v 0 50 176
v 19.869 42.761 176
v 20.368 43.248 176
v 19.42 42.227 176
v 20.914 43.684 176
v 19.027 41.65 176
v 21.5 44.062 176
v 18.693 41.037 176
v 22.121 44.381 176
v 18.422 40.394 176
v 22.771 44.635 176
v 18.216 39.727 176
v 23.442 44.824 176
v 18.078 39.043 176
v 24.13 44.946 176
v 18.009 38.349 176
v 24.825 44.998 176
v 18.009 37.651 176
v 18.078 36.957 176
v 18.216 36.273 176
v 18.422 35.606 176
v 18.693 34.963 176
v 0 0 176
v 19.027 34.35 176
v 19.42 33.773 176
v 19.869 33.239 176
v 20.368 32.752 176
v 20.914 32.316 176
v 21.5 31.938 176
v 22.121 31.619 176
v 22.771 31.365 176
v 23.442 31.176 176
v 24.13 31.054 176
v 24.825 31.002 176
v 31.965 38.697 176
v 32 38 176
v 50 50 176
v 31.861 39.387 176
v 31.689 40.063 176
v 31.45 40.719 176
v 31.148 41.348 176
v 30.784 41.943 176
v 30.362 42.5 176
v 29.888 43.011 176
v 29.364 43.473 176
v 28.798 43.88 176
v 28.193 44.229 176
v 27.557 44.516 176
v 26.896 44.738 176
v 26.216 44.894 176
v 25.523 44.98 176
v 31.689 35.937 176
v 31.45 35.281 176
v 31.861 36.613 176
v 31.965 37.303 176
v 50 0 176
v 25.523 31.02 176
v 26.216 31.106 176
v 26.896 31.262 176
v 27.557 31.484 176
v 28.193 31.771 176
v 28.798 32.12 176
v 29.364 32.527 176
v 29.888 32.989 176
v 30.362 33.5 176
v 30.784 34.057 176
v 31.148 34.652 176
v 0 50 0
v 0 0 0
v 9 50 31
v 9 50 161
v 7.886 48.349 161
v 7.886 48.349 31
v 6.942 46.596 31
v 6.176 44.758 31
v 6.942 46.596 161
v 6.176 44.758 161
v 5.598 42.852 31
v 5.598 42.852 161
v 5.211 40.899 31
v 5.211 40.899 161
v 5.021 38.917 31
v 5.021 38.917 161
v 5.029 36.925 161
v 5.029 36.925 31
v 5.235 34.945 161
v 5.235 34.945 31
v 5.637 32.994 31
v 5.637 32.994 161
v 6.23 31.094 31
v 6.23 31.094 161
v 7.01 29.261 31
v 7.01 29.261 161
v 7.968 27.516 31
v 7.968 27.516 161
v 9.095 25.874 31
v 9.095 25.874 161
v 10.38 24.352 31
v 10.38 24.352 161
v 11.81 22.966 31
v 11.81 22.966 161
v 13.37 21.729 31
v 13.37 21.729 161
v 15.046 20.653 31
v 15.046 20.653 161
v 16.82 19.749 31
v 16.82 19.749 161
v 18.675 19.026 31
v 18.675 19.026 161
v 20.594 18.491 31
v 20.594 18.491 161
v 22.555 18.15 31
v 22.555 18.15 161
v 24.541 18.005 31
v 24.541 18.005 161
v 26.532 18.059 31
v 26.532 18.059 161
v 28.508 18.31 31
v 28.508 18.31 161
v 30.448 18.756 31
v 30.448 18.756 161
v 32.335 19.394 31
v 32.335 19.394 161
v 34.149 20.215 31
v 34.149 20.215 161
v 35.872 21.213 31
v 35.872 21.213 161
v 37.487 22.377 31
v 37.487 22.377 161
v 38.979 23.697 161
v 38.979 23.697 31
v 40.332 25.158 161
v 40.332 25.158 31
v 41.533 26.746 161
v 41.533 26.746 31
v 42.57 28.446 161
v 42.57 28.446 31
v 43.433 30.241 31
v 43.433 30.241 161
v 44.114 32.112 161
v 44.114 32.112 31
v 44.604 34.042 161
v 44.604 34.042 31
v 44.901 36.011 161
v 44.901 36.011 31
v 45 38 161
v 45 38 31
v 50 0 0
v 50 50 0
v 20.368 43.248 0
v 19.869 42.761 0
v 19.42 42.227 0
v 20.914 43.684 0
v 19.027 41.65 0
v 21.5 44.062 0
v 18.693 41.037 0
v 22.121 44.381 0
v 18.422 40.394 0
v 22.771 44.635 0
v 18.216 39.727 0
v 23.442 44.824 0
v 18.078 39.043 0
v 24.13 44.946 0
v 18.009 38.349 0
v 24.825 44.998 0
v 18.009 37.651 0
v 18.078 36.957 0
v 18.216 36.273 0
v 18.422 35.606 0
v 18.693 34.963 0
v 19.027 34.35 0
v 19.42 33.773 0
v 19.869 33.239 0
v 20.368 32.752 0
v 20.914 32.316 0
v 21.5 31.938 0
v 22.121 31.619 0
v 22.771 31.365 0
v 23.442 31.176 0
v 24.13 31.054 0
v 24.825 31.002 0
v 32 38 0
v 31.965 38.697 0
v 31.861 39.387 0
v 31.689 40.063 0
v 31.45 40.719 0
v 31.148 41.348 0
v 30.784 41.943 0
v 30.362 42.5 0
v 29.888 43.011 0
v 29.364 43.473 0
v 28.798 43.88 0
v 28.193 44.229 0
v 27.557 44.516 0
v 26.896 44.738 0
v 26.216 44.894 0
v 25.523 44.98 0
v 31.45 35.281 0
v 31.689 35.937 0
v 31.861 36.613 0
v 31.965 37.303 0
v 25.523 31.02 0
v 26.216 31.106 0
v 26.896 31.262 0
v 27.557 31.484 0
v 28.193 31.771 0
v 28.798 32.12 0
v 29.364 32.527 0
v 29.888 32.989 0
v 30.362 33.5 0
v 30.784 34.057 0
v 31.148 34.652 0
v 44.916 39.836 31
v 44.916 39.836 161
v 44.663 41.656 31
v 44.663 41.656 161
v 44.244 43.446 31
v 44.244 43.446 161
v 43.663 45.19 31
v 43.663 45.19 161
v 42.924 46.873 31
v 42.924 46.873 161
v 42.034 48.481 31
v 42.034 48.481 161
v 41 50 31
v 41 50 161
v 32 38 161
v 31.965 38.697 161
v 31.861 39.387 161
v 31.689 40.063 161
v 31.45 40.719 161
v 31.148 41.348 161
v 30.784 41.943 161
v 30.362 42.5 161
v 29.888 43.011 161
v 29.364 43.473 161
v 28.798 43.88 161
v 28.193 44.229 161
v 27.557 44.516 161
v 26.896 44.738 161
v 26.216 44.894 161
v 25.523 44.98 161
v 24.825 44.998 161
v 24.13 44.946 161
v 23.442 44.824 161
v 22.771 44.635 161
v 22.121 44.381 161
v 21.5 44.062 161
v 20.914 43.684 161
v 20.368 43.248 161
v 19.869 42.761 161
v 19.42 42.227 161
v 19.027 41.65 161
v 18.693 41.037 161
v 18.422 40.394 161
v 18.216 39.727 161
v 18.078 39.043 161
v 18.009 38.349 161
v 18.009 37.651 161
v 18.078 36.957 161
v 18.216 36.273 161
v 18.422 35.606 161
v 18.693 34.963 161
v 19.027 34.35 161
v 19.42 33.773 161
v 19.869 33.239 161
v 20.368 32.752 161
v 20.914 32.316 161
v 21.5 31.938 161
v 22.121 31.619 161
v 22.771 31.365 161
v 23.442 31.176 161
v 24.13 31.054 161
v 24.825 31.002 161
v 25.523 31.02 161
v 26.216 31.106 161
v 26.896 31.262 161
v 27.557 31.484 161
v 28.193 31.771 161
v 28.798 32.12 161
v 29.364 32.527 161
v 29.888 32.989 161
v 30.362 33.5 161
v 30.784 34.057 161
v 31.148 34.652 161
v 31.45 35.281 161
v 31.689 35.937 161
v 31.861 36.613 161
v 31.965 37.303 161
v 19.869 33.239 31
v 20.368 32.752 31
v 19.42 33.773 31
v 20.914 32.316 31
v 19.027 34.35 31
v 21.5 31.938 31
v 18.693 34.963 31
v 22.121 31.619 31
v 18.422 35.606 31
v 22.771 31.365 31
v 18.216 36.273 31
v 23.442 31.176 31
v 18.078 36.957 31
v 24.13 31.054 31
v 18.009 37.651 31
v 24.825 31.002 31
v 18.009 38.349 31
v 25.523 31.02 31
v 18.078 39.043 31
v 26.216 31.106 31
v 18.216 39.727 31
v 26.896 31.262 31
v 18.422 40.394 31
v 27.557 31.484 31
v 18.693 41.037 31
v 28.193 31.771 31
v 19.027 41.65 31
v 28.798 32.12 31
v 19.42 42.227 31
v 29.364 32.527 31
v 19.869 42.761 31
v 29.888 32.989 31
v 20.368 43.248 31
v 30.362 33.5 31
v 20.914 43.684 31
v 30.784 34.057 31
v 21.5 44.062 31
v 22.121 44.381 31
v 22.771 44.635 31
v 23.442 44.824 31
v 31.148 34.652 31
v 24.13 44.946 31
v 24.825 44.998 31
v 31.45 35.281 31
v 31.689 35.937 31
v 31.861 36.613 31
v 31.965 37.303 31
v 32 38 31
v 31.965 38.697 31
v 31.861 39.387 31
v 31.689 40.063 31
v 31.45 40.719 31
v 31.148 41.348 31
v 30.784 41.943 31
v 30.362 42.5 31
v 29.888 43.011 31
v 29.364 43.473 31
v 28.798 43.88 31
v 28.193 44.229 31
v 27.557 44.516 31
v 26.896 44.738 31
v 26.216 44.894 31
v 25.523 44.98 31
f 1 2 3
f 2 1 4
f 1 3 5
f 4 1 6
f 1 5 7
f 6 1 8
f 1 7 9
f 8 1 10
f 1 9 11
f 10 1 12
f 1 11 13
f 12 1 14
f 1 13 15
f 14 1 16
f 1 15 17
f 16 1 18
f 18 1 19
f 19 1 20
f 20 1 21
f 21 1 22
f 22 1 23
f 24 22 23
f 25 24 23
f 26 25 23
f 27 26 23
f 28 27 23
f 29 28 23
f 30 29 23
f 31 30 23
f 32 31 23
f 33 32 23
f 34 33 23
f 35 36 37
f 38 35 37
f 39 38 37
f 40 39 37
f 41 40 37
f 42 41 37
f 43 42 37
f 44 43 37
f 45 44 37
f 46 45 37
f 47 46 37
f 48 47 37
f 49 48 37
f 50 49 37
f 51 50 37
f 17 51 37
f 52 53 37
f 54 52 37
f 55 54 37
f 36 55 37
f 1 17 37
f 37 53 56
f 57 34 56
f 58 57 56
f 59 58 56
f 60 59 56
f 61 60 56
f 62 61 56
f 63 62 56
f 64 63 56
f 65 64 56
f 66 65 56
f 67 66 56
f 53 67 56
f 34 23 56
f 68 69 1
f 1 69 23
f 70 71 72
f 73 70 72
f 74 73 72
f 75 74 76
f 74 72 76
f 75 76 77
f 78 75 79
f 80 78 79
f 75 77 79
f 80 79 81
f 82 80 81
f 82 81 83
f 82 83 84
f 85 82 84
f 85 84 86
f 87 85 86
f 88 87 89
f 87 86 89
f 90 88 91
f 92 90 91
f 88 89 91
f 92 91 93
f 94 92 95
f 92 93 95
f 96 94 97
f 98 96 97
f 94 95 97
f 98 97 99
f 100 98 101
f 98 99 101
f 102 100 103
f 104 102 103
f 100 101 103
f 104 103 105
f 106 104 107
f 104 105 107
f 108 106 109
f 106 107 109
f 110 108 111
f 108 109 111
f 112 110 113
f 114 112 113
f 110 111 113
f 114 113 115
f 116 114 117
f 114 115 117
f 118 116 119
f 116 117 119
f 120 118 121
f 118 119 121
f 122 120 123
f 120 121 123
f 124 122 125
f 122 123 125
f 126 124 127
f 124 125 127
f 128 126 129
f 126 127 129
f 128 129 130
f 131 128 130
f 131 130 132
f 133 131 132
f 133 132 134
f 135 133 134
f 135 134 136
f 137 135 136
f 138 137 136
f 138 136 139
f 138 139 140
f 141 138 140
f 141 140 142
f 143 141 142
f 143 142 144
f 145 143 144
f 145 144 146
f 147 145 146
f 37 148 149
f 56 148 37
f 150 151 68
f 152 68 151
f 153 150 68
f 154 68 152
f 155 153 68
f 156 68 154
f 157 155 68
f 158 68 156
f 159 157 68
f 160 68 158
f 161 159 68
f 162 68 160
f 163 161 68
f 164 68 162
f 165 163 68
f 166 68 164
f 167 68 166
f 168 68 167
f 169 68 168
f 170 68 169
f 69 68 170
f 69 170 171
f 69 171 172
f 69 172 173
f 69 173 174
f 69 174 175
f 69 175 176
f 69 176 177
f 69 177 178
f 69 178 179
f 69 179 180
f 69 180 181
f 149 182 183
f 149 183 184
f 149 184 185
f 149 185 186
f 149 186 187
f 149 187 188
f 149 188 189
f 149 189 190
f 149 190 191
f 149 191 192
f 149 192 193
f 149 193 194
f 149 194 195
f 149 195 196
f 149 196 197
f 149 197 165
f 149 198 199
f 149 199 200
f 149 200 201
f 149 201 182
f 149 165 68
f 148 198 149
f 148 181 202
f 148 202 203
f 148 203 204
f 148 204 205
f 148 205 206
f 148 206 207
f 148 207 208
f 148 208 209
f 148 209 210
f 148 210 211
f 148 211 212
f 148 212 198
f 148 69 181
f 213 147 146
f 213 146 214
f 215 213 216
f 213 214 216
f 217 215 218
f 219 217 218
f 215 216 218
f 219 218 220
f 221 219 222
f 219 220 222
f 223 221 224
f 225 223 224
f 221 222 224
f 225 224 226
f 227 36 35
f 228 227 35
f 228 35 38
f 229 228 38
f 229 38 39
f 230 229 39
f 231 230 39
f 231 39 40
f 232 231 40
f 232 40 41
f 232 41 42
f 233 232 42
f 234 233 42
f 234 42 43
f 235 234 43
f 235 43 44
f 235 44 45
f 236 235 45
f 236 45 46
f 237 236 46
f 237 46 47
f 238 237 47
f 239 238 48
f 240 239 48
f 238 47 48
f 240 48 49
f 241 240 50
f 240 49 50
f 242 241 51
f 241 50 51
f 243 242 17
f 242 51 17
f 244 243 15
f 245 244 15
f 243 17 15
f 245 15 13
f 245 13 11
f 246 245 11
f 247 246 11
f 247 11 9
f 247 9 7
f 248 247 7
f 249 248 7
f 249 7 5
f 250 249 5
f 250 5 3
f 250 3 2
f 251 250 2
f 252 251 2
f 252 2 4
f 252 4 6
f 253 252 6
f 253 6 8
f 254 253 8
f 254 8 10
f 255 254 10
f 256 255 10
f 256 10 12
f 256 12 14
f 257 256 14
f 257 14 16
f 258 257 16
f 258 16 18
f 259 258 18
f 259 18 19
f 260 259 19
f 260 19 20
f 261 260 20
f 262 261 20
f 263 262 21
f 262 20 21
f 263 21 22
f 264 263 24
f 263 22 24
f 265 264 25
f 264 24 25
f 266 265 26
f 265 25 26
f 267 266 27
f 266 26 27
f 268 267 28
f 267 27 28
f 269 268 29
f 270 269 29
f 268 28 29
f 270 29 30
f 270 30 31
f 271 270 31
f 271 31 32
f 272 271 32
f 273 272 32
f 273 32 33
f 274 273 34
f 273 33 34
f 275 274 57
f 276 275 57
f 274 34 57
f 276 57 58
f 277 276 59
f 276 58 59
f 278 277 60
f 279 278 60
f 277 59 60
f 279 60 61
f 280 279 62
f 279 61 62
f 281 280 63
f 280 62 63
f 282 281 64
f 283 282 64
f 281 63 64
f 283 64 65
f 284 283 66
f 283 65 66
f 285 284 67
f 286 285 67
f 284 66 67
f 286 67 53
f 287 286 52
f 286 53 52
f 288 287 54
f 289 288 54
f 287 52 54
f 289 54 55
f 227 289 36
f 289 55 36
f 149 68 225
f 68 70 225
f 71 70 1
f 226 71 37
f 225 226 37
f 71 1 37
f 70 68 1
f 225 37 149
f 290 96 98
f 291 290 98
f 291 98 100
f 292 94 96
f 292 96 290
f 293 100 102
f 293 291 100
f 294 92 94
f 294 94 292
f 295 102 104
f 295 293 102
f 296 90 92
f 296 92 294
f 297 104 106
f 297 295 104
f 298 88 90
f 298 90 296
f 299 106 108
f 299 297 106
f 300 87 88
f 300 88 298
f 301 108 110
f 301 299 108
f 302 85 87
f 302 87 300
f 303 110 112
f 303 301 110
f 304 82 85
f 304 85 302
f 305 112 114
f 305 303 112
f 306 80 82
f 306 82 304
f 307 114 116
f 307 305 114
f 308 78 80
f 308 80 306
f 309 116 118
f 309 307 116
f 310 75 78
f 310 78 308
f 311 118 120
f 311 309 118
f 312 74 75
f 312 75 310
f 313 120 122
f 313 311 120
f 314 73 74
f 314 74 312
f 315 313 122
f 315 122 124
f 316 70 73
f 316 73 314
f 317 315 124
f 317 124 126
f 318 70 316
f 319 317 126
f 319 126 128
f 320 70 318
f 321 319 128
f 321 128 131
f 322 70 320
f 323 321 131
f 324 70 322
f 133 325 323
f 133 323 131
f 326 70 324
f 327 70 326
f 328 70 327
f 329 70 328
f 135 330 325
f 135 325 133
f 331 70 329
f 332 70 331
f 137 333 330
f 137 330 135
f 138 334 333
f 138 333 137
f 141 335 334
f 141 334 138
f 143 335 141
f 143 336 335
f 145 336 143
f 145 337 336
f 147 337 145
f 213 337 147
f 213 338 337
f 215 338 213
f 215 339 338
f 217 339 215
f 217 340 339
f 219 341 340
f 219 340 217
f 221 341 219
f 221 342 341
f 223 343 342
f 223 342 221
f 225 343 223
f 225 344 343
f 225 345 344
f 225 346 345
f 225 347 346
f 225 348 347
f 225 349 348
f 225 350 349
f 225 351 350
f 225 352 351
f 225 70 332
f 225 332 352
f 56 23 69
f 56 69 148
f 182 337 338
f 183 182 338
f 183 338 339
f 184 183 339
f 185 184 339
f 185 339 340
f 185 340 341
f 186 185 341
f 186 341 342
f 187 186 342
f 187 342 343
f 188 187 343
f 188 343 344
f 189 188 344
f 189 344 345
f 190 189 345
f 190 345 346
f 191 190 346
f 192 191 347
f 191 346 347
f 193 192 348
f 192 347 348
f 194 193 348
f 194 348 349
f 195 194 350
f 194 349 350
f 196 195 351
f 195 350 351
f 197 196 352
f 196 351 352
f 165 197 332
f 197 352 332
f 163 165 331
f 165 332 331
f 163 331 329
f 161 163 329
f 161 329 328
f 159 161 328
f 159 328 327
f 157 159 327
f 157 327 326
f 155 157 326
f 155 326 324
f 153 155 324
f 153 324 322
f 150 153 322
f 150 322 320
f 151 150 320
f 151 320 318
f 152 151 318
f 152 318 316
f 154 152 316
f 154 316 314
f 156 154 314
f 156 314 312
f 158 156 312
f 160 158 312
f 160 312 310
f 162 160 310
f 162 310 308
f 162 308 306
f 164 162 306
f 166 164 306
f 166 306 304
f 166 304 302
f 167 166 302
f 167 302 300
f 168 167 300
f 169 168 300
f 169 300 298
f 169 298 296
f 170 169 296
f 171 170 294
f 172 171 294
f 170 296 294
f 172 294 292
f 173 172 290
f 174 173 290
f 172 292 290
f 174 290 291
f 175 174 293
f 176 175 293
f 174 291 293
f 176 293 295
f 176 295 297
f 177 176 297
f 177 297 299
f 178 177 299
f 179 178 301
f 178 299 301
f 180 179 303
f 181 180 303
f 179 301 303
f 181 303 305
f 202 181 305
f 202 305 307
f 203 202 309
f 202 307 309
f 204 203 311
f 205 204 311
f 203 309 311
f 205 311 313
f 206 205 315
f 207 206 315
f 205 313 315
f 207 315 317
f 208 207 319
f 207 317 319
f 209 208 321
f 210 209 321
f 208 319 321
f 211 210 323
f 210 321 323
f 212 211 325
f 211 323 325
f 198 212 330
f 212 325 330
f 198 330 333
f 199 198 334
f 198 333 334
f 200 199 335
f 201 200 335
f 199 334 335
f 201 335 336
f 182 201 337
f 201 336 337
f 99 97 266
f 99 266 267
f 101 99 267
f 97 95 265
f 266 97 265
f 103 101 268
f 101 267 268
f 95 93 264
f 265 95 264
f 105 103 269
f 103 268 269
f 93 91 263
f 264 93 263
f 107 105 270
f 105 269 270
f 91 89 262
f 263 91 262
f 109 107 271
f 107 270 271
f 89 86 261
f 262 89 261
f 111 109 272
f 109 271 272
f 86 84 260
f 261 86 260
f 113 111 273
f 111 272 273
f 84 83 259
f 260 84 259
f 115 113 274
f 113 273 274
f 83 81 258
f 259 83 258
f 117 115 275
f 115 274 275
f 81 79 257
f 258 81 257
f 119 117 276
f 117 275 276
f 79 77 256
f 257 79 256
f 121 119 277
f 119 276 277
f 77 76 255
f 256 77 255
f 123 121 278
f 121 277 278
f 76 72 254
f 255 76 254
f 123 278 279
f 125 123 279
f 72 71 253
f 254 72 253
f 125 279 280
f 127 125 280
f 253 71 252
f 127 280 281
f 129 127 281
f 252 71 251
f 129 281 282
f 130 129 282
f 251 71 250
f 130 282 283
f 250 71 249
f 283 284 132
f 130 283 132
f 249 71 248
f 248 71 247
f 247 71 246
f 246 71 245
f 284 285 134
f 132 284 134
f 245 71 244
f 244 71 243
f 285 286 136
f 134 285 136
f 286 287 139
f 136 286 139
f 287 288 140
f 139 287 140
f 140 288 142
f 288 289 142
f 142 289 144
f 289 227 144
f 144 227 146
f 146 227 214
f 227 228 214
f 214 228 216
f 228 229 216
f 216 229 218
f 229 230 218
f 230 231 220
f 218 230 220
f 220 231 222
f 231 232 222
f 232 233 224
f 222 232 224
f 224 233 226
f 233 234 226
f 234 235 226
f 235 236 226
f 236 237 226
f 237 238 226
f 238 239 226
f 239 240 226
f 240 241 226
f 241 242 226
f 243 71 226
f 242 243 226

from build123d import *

# Parameters (mm, degrees)
F0_W     = 50
F0_H     = 176
F1_DEPTH = 50
F2_R     = 7
F3_DEPTH = 176.001
F4_START = -15
F4_DEPTH = 130


with BuildPart() as f1:
    # F0 (on Front) → F1 (new body)
    with BuildSketch(Plane.XZ):
        with Locations((25, 88)):
            Rectangle(F0_W, F0_H)
    extrude(amount=-F1_DEPTH)

    # F2 (on face) → F3 (cut, through all)
    with BuildSketch(Plane.XY.offset(176)):
        with Locations((25, 38)):
            Circle(F2_R)
    extrude(amount=-F3_DEPTH, mode=Mode.SUBTRACT)

    # F2 (on face) → F4 (cut)
    with BuildSketch(Plane.XY.offset(176).offset(F4_START)):
        with BuildLine():
            ThreePointArc((9, 50), (18.6754446797, 19.026334039), (45, 38))
            ThreePointArc((45, 38), (43.973665961, 44.3245553203), (41, 50))
            Line((41, 50), (9, 50))
        make_face()
        with Locations((25, 38)):
            Circle(F2_R, mode=Mode.SUBTRACT)
    extrude(amount=-F4_DEPTH, mode=Mode.SUBTRACT)


solid = f1.part
